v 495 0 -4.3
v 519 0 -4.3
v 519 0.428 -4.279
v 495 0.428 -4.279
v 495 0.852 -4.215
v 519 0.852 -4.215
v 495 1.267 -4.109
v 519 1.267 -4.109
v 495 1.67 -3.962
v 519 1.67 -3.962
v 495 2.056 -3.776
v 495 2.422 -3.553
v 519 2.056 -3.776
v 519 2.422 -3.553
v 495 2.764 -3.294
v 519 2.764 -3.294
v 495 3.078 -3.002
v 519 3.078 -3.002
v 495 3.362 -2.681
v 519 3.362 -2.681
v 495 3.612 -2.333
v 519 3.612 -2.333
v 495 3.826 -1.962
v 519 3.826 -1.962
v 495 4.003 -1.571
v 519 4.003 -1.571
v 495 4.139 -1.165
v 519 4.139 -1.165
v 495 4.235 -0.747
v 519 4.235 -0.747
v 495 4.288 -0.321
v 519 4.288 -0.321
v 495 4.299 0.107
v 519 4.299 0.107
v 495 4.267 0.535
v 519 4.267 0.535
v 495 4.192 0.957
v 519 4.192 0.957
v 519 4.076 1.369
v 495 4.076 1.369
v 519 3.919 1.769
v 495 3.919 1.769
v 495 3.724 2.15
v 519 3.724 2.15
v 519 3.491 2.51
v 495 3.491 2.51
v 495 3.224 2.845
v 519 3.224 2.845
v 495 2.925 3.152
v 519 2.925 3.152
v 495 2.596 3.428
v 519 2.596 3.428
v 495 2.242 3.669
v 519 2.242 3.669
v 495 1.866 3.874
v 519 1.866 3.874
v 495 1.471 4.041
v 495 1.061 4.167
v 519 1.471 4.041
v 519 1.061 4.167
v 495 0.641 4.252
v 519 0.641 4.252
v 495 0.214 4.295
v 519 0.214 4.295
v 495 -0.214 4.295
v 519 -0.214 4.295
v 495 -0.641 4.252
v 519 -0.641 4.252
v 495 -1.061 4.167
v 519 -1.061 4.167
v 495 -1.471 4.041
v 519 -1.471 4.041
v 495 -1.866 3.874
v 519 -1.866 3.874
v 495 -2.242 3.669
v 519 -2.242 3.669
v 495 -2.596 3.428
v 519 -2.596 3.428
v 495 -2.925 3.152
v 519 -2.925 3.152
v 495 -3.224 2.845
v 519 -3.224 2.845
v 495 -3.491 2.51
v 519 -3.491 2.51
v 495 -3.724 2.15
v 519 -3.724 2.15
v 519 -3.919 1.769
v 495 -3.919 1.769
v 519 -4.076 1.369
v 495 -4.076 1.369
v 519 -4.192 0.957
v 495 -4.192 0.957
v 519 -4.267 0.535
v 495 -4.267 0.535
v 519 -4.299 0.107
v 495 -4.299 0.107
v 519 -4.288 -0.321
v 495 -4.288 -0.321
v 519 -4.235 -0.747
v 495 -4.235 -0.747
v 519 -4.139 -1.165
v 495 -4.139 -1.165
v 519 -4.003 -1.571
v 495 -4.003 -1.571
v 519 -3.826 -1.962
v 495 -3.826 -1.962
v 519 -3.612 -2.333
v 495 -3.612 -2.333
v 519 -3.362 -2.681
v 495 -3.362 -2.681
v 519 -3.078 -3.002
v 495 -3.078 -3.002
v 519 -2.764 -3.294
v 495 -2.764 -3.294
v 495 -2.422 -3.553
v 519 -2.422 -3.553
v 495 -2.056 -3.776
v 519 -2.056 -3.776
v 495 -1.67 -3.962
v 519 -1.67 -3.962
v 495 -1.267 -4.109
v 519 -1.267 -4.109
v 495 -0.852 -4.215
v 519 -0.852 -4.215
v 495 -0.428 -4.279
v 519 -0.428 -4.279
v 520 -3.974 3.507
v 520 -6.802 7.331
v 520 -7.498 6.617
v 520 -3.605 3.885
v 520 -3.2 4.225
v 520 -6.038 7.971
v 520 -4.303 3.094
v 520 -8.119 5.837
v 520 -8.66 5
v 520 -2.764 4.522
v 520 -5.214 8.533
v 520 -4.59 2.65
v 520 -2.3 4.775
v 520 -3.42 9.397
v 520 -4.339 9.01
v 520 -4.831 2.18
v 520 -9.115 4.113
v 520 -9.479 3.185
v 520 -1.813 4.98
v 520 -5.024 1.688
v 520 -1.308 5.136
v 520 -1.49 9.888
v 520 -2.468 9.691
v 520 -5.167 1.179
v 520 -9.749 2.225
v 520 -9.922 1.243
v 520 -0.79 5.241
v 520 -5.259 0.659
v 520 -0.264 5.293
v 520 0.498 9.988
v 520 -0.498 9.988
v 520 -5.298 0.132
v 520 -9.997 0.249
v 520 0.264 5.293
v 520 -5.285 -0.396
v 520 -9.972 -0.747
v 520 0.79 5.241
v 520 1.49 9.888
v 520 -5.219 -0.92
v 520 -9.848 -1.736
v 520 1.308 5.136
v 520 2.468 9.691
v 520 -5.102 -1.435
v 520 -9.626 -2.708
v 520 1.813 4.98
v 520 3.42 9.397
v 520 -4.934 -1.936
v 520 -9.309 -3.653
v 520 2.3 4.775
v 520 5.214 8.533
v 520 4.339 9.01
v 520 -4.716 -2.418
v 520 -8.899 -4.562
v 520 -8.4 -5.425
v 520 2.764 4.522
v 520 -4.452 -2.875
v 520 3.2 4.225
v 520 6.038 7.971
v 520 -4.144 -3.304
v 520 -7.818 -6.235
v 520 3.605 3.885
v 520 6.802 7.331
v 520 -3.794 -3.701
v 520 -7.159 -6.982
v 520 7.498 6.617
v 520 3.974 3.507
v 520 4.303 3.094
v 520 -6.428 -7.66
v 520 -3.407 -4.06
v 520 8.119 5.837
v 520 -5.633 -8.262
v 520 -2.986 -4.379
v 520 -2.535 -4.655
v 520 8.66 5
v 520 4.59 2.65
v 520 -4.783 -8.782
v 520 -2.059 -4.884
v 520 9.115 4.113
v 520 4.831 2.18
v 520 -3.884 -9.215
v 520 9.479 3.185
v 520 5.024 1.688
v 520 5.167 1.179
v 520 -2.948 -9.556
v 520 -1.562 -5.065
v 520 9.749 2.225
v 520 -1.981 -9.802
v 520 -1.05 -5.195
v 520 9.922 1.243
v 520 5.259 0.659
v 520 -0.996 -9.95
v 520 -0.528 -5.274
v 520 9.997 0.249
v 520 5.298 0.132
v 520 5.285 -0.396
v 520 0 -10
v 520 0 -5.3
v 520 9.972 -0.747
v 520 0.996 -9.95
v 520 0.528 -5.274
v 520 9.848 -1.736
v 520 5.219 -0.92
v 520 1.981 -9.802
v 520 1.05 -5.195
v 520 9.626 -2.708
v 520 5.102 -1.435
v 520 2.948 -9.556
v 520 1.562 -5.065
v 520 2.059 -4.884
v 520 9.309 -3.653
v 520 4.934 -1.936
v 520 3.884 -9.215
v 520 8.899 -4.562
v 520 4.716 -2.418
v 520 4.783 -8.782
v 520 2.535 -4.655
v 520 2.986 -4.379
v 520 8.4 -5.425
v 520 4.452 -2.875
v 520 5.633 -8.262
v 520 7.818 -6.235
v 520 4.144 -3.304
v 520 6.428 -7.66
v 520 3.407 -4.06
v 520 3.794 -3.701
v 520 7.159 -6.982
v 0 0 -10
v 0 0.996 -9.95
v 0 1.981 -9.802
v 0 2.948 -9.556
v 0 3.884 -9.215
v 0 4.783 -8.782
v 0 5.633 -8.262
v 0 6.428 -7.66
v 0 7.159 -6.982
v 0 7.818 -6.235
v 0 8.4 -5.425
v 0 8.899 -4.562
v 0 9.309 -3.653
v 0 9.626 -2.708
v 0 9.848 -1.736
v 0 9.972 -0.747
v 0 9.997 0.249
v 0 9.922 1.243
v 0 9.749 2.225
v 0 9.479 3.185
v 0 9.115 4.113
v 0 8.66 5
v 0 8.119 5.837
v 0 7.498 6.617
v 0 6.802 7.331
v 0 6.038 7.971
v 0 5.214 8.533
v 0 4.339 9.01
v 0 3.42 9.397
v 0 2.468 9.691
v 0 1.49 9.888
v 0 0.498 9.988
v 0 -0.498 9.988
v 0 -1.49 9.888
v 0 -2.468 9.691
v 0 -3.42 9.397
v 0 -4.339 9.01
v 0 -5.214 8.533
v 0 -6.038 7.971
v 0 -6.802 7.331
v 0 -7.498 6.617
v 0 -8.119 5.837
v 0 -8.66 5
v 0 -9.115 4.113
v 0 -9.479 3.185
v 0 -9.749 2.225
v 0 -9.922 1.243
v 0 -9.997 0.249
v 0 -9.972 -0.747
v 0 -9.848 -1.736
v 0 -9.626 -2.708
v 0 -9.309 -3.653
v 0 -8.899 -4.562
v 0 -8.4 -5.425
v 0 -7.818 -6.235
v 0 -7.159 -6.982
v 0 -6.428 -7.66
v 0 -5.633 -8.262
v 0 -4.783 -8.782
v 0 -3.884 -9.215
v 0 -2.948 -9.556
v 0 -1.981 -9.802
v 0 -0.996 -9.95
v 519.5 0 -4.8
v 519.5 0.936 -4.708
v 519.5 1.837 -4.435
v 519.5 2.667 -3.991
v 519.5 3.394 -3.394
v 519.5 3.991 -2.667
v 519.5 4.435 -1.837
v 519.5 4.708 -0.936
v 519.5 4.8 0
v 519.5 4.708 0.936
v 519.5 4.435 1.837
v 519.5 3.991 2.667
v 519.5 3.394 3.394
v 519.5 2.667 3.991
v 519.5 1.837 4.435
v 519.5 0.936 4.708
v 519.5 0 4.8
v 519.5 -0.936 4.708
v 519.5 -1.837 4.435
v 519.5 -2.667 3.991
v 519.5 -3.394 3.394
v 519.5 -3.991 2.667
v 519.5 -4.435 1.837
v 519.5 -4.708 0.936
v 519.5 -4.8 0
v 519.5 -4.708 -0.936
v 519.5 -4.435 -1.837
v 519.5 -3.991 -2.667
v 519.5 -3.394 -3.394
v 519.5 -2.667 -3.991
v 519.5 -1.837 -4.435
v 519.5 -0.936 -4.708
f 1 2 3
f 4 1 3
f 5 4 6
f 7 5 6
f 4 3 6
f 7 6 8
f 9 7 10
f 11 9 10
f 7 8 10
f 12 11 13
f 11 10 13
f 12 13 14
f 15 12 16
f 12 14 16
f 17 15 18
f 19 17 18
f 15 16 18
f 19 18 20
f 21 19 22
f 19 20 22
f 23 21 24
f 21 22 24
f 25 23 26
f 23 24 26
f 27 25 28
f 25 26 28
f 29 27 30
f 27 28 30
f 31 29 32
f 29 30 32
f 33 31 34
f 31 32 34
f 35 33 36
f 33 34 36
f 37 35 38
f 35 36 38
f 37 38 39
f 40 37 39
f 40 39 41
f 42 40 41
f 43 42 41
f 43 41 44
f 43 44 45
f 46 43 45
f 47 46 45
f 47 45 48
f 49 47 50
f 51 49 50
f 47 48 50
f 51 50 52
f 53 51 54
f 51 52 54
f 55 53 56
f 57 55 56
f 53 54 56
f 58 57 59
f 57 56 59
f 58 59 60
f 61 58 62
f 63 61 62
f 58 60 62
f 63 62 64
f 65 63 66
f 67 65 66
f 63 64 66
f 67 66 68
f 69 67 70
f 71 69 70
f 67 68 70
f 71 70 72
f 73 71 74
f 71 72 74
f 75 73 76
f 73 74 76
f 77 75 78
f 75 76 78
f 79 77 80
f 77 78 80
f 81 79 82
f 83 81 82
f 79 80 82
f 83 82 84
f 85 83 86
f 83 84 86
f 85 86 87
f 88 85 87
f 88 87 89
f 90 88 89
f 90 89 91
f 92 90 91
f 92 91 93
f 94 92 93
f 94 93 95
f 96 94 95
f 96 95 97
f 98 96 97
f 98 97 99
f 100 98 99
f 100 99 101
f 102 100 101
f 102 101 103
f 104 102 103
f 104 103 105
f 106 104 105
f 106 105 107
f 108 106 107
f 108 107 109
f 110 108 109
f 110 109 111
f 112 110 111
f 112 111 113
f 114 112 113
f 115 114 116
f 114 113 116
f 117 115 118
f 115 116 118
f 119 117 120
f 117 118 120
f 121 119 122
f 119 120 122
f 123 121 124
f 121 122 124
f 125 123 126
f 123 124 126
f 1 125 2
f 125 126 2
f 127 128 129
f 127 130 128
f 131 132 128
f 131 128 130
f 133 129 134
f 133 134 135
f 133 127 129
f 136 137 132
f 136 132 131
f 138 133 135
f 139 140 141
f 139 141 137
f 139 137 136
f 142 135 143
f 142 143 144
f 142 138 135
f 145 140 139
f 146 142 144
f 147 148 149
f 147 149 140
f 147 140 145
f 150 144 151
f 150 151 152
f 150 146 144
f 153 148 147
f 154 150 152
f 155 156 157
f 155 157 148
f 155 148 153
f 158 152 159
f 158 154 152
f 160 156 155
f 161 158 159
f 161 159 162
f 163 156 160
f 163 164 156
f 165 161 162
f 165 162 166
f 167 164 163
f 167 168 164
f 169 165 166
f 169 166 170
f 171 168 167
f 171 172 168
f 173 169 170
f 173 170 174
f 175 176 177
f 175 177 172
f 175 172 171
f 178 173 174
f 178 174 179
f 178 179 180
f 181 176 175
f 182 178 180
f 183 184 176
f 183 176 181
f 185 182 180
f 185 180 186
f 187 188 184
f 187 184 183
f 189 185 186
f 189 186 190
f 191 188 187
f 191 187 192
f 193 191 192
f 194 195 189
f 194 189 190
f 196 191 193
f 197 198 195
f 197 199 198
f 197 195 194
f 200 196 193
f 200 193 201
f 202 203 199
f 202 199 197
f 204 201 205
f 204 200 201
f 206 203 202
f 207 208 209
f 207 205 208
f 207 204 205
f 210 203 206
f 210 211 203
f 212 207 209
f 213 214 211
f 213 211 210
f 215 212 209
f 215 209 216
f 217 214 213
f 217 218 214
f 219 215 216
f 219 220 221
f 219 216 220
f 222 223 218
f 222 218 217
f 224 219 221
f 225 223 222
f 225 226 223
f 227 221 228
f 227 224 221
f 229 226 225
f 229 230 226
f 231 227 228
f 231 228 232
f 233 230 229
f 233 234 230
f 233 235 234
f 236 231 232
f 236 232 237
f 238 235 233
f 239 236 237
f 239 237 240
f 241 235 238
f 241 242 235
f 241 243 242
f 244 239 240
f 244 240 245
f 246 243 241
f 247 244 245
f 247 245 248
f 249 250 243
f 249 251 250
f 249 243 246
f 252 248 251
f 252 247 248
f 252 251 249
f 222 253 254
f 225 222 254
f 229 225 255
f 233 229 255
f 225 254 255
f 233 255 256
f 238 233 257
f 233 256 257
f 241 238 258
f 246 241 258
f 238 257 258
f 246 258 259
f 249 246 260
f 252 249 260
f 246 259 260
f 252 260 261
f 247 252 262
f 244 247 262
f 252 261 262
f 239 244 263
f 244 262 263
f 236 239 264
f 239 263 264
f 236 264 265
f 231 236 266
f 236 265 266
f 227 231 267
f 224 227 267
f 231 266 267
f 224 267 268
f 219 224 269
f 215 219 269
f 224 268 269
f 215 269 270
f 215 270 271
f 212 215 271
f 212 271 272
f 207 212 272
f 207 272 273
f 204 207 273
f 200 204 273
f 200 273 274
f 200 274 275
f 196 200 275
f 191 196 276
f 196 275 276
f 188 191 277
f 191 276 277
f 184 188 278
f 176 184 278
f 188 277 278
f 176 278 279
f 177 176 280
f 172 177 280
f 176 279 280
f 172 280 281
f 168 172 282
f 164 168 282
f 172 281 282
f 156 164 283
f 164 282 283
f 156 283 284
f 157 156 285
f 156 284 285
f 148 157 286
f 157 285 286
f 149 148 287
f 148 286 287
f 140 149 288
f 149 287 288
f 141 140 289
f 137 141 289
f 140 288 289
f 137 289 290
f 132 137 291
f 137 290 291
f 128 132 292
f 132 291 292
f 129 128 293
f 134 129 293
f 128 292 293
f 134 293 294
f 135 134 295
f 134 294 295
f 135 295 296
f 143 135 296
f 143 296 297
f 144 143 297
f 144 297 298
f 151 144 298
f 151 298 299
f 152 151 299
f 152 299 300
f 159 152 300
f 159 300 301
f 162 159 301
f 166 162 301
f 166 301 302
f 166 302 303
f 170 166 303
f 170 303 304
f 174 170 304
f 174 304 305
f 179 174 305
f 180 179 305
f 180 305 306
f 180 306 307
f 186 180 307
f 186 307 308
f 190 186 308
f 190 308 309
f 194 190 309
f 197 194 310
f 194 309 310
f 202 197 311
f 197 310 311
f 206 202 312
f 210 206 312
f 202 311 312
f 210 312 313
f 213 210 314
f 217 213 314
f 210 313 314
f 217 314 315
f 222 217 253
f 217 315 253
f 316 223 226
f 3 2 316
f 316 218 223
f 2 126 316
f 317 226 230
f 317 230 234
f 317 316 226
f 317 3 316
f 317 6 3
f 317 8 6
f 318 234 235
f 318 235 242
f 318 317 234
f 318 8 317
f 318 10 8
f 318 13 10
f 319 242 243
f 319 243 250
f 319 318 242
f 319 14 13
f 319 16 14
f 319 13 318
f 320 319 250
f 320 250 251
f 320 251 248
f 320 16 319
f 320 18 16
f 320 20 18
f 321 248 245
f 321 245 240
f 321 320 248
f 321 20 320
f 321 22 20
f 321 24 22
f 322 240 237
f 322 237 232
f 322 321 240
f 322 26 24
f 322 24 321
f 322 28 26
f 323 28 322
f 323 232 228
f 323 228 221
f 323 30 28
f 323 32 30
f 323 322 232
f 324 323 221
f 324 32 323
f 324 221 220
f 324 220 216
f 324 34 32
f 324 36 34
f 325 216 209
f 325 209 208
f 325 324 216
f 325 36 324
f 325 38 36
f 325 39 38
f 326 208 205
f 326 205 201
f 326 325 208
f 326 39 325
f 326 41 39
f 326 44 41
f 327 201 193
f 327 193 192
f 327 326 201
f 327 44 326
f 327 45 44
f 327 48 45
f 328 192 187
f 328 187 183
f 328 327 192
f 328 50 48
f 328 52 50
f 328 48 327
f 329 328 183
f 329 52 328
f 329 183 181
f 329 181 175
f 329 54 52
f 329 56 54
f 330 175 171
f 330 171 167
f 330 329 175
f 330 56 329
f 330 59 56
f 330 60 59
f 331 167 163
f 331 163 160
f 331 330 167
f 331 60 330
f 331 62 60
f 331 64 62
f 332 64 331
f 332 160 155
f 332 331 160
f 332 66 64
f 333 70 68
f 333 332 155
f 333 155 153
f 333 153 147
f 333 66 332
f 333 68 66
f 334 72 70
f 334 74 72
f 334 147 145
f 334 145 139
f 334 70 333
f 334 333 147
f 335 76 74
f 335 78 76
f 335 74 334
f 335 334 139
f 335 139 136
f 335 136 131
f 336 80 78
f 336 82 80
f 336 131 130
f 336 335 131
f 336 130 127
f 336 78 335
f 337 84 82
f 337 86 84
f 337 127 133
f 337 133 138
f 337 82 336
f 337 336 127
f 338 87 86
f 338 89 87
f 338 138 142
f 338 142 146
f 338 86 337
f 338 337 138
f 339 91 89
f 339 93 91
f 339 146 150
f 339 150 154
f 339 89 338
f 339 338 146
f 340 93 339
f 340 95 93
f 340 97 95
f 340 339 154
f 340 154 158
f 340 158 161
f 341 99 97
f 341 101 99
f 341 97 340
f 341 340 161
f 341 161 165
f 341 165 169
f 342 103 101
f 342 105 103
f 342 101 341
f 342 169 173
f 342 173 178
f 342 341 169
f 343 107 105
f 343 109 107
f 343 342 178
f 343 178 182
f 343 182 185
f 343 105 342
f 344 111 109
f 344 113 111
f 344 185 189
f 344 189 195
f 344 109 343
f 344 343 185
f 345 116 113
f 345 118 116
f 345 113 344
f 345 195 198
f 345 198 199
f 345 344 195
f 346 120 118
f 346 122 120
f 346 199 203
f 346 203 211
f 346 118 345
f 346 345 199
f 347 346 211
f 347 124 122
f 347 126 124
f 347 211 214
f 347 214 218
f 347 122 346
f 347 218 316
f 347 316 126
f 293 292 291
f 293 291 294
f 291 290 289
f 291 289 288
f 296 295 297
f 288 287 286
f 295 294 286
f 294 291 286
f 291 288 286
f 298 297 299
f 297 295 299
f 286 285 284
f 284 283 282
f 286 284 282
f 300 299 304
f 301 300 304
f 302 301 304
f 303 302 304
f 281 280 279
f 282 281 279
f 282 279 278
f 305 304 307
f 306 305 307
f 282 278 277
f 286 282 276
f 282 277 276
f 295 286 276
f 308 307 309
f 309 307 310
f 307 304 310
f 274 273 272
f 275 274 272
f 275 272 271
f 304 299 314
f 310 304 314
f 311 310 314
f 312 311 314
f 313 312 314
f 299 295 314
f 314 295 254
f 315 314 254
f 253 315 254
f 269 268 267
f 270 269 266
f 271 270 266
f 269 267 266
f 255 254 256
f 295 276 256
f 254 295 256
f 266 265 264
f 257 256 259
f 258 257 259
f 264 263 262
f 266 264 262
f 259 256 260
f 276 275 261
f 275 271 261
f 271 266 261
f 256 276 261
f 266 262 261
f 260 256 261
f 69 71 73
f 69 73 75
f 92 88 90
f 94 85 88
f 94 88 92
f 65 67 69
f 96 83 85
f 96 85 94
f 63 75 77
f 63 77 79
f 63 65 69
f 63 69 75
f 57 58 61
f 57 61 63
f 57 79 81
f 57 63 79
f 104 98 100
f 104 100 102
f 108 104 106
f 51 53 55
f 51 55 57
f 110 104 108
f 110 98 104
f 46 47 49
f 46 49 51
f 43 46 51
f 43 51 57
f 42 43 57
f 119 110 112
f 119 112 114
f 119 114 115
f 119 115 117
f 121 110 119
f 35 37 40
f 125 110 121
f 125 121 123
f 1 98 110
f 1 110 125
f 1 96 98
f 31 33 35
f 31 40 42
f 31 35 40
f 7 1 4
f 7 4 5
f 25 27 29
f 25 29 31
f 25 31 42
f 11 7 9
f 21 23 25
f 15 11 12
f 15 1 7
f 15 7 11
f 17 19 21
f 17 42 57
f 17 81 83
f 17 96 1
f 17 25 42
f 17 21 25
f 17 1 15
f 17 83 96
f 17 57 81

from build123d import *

# Parameters (mm, degrees)
SKETCH_1_R          = 10
EXTRUDE_1_DEPTH     = 520
SKETCH_2_R          = 4.3
CUT_EXTRUDE_2_DEPTH = 25
CHAMFER_1_SIZE      = 1


with BuildPart() as part:
    # 草图1 → 拉伸1 (new body)
    with BuildSketch(Plane(origin=(0, 0, 0), x_dir=(0, 0, -1), z_dir=(1, 0, 0))):
        Circle(SKETCH_1_R)
    extrude(amount=EXTRUDE_1_DEPTH)

    # 草图2 → 拉伸2 (cut)
    with BuildSketch(Plane(origin=(520, 0, 0), x_dir=(0, 0, -1), z_dir=(1, 0, 0))):
        Circle(SKETCH_2_R)
    extrude(amount=-CUT_EXTRUDE_2_DEPTH, mode=Mode.SUBTRACT)

    # 倒角1
    chamfer_1_edges = [part.edges().sort_by_distance(p)[0] for p in [
        (520, 0, 4.3),
    ]]
    chamfer(chamfer_1_edges, length=CHAMFER_1_SIZE)


solid = part.part
